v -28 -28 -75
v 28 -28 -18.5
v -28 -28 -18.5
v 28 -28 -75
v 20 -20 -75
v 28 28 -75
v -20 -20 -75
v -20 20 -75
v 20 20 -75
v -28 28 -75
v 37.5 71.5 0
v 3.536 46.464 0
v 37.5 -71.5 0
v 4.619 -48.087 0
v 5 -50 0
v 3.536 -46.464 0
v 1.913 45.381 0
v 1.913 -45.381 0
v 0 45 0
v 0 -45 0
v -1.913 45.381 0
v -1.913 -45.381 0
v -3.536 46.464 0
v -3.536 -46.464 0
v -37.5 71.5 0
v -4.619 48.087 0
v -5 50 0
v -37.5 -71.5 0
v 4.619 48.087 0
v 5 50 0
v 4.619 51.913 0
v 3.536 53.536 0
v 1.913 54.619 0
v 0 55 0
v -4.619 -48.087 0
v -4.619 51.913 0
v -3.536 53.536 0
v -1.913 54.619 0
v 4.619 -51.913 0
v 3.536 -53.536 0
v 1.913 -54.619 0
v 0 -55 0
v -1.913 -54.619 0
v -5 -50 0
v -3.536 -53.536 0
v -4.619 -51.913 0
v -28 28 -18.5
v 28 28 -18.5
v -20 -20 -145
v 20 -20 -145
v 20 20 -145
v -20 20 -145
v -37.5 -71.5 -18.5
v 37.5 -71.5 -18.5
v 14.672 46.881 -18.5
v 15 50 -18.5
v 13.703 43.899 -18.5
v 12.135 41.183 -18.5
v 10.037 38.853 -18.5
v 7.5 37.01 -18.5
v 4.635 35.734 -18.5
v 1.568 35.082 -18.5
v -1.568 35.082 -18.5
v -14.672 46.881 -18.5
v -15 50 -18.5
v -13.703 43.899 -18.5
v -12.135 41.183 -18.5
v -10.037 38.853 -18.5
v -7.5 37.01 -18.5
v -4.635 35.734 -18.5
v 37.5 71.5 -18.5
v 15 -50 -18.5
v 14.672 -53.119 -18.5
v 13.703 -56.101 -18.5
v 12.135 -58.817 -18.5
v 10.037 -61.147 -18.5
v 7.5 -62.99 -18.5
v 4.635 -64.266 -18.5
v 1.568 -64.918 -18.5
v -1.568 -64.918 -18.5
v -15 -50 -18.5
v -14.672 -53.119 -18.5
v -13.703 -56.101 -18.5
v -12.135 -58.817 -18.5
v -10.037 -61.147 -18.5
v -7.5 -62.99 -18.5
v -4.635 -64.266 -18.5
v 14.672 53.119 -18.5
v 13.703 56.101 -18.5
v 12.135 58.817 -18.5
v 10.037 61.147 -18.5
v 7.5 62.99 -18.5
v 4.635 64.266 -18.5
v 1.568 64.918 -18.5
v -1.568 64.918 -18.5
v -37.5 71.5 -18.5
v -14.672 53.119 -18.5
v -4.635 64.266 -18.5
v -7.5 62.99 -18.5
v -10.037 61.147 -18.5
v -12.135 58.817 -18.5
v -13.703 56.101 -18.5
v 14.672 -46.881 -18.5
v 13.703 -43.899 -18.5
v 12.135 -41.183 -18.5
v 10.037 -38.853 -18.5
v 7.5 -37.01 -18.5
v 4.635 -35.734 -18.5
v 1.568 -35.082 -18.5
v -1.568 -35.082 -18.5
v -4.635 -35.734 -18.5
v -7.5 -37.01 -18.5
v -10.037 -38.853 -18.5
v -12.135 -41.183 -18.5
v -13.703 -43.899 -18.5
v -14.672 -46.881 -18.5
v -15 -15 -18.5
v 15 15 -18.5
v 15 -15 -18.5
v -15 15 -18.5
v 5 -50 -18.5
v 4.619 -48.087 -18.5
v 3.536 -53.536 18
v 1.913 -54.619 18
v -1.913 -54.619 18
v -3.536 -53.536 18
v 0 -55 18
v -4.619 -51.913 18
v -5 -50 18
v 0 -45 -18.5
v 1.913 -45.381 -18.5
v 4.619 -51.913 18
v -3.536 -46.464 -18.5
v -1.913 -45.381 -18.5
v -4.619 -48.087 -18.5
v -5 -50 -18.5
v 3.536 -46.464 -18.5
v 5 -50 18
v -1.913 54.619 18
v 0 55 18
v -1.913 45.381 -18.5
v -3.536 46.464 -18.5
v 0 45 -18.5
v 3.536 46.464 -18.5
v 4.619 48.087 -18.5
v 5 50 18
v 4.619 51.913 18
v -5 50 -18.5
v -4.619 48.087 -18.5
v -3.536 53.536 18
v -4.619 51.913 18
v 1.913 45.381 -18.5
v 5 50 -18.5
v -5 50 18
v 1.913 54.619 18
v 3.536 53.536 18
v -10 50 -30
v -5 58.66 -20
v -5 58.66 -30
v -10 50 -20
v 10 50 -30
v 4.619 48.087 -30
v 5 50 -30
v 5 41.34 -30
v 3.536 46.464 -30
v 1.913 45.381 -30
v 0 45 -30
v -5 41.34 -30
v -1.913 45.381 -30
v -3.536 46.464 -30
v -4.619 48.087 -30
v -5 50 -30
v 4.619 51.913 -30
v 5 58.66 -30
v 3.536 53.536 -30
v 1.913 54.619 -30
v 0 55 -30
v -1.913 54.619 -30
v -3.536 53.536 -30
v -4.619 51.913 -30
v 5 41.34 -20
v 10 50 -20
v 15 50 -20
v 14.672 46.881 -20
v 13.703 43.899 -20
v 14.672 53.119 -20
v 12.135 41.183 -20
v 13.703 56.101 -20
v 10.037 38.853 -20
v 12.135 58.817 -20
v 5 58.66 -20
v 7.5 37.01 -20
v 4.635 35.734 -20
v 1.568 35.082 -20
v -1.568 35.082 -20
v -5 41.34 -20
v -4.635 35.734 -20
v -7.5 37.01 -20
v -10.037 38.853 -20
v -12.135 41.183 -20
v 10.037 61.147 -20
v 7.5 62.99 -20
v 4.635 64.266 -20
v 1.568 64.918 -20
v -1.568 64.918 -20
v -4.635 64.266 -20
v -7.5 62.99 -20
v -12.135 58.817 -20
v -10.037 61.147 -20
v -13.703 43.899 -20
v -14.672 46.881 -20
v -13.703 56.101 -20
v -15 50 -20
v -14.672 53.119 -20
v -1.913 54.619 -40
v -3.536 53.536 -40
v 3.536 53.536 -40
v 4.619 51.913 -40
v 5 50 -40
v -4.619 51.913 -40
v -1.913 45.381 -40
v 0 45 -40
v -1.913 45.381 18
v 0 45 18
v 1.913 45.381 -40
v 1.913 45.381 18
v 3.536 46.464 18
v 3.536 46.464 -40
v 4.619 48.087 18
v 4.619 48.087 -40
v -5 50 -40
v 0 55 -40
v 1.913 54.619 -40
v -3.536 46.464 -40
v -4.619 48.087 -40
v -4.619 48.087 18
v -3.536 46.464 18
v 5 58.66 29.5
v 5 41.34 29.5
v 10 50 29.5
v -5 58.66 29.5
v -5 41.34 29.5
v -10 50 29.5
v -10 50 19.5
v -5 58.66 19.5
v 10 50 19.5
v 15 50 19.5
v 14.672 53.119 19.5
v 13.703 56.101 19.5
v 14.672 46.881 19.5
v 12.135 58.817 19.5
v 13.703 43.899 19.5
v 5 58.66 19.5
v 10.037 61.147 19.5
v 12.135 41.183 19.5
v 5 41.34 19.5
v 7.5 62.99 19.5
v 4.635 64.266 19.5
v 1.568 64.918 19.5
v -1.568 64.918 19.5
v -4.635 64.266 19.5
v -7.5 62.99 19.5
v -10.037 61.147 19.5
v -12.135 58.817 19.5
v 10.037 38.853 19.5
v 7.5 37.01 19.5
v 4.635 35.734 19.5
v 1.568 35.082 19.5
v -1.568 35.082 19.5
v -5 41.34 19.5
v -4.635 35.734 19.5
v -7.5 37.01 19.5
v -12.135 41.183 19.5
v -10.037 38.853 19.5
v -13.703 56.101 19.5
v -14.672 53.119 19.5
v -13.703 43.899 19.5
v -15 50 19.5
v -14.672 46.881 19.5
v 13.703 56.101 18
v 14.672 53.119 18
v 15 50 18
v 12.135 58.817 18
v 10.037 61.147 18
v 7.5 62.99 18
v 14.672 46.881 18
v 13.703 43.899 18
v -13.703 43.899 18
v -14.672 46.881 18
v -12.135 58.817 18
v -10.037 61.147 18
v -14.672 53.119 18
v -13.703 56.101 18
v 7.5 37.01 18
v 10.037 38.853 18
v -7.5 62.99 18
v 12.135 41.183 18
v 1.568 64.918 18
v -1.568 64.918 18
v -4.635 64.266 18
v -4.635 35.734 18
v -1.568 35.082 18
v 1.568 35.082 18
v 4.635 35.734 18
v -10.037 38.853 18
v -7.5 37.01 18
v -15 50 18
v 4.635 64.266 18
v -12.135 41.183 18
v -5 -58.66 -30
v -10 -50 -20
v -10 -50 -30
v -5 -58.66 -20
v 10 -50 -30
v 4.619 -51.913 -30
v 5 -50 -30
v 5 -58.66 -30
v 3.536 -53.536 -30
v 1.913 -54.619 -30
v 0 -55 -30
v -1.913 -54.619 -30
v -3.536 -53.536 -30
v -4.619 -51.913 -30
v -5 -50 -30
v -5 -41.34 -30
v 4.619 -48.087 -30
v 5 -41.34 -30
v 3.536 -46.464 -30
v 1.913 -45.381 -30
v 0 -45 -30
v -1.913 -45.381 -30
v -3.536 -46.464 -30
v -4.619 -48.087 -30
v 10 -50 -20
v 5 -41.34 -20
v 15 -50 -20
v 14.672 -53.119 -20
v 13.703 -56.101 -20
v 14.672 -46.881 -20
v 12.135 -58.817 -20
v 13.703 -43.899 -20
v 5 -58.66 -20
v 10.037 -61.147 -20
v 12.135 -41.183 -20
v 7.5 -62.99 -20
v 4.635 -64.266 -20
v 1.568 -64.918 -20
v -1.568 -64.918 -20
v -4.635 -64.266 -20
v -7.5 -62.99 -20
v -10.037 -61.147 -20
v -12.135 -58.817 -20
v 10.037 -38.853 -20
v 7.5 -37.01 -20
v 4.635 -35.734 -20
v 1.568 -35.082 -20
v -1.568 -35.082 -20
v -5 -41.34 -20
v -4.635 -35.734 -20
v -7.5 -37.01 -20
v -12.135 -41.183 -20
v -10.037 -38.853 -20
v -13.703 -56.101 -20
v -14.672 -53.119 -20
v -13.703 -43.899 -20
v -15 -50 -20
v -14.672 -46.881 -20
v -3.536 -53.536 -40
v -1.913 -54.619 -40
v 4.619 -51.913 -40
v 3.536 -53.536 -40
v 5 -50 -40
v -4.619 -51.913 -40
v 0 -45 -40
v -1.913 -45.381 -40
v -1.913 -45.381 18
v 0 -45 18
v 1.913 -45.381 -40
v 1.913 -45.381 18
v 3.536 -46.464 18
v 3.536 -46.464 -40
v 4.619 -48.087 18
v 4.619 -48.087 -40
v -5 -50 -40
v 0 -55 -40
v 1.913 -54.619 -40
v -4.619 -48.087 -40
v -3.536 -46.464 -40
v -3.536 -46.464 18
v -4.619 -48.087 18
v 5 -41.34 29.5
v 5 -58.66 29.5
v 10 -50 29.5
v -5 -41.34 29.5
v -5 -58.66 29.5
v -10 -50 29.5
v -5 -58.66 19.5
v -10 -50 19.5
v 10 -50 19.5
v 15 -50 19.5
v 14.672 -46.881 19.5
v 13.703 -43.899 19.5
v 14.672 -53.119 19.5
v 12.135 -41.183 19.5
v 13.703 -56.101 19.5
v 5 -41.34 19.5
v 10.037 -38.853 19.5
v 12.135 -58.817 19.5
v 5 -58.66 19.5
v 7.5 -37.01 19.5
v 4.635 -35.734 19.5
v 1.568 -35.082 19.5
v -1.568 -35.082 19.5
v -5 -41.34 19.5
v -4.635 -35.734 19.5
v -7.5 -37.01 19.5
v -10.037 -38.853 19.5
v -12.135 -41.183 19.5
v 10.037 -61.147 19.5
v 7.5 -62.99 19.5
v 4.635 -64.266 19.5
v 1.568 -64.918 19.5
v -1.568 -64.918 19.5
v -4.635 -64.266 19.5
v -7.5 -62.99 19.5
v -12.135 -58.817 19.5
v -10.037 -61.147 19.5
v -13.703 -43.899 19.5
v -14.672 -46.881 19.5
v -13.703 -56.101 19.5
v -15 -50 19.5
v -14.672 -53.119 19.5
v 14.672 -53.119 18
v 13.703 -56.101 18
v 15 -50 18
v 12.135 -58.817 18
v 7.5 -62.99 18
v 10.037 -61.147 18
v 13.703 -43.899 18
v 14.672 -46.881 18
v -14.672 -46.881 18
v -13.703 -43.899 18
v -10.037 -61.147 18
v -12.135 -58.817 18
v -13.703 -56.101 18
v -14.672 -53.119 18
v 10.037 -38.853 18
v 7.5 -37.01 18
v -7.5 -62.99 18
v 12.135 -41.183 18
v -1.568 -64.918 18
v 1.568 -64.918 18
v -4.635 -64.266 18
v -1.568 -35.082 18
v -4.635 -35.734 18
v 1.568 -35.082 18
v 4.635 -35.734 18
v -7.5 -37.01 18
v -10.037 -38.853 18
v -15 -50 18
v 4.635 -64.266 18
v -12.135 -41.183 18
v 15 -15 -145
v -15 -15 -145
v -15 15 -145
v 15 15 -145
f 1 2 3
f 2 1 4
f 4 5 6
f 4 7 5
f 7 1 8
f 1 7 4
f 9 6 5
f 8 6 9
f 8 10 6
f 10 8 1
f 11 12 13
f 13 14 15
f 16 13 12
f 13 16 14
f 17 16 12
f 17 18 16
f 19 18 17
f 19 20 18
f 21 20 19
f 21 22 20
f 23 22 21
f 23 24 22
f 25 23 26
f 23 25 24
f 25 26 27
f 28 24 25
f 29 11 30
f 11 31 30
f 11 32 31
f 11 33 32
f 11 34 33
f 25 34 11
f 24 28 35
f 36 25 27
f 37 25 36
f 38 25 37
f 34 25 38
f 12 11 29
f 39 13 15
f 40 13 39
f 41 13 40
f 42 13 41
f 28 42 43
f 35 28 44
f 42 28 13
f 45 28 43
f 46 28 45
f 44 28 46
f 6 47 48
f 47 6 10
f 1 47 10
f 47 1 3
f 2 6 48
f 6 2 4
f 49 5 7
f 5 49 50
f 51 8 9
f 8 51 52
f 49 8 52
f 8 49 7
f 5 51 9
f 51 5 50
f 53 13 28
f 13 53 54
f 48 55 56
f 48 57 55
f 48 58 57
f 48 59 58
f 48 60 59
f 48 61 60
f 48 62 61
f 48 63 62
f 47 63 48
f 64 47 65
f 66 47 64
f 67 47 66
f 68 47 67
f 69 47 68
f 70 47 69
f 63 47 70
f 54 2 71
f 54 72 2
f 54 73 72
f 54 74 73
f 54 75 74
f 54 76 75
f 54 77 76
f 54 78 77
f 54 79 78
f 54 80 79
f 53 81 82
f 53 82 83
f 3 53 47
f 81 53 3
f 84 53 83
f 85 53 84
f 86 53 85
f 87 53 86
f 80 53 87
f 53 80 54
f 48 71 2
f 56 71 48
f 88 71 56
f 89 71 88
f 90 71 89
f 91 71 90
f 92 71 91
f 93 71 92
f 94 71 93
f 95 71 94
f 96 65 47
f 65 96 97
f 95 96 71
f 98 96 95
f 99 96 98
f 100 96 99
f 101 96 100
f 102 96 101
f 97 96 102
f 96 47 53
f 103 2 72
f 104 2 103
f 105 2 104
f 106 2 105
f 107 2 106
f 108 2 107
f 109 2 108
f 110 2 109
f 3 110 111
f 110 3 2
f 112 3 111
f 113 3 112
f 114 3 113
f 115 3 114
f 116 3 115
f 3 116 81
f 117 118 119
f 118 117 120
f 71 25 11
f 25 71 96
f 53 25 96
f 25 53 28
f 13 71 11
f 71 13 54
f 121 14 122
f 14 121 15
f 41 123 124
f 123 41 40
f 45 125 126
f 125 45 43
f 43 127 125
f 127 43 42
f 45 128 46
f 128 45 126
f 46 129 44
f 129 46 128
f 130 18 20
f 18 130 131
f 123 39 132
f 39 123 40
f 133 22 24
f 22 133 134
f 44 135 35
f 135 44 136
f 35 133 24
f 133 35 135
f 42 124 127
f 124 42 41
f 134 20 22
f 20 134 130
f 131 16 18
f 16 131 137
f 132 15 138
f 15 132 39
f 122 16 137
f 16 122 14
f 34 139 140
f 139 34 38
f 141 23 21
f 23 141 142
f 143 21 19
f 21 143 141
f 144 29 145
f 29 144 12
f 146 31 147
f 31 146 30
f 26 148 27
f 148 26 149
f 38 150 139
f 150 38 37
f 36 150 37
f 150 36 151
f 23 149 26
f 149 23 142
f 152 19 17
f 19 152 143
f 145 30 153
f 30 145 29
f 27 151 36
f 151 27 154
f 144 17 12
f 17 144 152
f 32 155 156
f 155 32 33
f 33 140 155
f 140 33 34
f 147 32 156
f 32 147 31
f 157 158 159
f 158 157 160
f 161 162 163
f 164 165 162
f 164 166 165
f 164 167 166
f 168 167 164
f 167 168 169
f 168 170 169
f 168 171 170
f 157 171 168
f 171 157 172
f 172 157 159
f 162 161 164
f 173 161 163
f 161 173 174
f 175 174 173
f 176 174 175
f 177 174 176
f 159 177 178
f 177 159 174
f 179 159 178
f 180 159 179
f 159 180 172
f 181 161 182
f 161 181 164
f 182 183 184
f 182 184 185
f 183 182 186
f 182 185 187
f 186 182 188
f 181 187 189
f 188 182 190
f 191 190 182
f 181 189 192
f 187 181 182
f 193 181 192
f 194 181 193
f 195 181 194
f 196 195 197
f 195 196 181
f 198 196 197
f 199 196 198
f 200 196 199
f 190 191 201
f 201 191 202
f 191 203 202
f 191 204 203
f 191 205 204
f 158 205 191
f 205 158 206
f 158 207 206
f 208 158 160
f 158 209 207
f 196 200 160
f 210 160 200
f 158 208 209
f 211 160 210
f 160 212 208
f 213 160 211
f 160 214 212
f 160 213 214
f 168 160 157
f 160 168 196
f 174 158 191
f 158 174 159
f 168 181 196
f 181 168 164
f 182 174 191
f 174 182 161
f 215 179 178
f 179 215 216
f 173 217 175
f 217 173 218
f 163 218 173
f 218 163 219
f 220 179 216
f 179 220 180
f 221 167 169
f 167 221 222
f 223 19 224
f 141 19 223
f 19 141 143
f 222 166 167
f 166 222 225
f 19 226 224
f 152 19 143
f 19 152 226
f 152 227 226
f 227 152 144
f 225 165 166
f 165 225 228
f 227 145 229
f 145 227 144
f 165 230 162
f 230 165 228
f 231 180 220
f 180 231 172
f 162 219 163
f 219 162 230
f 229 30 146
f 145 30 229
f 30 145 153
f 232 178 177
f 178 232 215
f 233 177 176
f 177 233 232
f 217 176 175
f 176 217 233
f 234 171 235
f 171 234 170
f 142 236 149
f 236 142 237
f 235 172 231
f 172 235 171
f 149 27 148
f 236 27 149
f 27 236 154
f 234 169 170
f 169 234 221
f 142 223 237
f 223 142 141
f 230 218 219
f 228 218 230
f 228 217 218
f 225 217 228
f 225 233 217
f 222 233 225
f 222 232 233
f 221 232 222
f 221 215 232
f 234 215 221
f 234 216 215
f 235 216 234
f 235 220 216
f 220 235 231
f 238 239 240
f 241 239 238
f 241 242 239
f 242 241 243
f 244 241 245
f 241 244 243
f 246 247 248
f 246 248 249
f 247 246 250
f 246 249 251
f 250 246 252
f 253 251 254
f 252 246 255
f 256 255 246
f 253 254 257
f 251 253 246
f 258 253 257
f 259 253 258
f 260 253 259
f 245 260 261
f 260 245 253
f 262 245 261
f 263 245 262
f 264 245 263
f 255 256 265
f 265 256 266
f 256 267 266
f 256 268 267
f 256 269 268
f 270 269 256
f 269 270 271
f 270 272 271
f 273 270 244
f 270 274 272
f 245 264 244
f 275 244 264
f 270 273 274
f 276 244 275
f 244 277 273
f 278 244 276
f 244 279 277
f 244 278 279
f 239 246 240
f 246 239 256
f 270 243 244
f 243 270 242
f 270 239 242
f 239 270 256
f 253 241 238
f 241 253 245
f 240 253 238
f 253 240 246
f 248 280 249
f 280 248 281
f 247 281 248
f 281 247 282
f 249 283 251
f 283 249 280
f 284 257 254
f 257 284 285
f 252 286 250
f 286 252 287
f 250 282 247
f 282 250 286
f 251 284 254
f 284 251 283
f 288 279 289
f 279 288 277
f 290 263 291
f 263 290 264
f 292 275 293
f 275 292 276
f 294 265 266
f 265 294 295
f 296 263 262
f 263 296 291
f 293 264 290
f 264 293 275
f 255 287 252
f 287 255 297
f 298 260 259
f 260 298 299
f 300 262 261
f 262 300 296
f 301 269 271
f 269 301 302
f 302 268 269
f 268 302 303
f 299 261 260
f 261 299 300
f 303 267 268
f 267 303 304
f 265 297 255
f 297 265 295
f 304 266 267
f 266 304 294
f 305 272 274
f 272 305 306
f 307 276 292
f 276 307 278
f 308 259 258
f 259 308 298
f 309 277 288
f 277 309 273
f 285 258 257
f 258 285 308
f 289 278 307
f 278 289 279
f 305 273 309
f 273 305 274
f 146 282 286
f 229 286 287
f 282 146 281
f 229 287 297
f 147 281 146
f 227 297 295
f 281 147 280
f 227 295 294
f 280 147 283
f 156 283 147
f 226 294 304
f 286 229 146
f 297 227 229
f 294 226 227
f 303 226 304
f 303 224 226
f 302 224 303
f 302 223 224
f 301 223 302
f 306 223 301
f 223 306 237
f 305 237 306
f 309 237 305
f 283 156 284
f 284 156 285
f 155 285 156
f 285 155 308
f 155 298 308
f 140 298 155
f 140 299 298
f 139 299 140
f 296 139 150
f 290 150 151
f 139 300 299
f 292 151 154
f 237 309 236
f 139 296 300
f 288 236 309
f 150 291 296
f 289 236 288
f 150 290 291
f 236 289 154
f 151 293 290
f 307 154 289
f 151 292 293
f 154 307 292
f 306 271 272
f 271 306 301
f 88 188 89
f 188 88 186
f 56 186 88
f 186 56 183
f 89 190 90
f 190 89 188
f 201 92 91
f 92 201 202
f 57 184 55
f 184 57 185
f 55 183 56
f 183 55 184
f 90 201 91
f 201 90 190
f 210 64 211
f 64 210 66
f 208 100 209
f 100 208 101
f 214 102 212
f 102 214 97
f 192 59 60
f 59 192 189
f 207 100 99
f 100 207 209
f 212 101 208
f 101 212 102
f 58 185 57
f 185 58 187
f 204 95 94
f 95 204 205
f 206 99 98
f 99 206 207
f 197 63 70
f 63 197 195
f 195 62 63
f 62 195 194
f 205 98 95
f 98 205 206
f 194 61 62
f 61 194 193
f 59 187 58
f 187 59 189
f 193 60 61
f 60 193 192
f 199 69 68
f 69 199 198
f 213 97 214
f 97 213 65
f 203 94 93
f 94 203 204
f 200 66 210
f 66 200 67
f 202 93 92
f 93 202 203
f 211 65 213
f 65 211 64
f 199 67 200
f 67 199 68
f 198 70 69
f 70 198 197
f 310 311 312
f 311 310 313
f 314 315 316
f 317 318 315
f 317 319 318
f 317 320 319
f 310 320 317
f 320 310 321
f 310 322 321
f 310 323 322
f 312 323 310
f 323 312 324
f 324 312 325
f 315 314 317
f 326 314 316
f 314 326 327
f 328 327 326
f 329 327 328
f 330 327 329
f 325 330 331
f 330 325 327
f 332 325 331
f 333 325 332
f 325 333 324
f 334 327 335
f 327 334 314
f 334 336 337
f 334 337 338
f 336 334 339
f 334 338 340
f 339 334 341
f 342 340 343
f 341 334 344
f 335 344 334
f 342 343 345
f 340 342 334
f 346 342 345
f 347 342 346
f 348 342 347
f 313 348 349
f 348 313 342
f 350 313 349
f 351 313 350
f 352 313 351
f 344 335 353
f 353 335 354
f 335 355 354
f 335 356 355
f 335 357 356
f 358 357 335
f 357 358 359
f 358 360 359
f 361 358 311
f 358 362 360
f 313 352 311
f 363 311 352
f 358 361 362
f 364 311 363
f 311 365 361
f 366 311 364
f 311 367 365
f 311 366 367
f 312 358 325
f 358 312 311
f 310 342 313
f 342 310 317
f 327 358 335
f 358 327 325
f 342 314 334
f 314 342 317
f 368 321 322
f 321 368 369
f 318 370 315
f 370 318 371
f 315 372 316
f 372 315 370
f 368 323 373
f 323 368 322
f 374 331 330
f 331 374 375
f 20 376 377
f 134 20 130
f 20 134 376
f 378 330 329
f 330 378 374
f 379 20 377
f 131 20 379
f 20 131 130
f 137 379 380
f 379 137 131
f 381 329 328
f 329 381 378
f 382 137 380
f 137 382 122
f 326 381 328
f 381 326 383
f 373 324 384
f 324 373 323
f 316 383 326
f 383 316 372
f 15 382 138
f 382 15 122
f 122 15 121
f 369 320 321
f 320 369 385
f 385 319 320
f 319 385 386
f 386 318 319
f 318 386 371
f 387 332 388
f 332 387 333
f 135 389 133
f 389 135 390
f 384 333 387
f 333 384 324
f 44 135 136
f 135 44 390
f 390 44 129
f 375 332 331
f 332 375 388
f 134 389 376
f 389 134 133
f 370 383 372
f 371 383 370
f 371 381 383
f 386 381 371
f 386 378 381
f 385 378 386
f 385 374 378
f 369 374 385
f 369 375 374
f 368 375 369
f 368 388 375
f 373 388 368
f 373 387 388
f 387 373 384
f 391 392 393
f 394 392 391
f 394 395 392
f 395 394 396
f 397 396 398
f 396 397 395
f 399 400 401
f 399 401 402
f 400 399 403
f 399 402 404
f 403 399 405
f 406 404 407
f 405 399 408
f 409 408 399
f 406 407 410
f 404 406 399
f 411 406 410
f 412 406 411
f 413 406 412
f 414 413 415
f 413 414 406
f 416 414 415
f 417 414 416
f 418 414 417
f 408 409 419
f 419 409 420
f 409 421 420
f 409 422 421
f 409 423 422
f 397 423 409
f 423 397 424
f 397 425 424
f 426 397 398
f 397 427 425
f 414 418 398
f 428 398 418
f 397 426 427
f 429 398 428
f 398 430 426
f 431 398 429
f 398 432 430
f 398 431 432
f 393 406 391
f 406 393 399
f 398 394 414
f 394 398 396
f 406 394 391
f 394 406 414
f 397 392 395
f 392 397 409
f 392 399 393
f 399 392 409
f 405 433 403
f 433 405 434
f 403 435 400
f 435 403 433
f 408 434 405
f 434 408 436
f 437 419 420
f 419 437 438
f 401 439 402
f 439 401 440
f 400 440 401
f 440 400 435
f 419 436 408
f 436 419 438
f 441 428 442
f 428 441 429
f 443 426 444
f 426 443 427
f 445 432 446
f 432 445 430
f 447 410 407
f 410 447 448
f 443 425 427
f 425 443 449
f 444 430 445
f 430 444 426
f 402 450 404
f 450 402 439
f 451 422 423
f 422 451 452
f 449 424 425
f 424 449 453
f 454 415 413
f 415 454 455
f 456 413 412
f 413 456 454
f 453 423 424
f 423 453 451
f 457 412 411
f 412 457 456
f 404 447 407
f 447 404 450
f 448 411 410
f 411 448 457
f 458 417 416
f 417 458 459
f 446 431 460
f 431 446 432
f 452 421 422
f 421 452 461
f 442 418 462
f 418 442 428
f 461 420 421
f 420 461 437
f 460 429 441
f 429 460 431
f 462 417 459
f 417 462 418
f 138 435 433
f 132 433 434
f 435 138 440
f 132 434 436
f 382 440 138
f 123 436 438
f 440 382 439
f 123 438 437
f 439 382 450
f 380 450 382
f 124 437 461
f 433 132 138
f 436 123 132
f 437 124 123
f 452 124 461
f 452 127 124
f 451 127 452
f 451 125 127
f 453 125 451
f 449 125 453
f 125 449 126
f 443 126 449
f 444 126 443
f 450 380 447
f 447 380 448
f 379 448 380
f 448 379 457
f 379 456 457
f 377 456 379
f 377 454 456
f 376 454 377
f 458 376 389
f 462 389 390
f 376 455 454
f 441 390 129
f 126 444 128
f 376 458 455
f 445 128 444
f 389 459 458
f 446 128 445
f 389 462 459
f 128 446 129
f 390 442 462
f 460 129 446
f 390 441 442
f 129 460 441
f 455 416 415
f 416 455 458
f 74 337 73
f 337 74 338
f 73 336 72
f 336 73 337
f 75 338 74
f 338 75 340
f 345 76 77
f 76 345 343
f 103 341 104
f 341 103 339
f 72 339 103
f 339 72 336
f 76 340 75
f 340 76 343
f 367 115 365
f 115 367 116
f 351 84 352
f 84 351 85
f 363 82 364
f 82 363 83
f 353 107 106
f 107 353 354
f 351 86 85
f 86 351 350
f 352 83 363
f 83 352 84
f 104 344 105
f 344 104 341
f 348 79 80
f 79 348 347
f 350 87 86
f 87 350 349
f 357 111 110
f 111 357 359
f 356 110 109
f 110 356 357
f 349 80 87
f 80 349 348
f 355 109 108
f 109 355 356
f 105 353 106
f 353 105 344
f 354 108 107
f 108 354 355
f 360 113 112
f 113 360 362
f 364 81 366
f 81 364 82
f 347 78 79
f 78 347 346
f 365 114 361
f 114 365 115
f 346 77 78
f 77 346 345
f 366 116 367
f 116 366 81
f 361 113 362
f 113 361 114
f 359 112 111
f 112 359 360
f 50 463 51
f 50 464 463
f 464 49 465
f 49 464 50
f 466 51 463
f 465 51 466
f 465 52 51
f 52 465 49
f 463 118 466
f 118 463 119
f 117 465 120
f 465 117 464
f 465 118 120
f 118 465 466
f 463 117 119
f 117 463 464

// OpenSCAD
// file: ../common/beam_hollow_rectangular.scad
module beam_hollow_rectangular(L, w, d, t, suppress_shopping_outputs = false) {
    difference() {
        cube([w, d, L], center = true);
        cube([w - t * 2, d - t * 2, L], center = true);
    }
    // Shopping
    if (!suppress_shopping_outputs) {
        echo(str("Rectangular Aluminium hollow beam: Rectangular Aluminium hollow beam ", L, "mm x ", w, "mm x ", d, "mm x ", t, "mm - x1"));
    }
}

beam_hollow_rectangular(500, 50, 30, 5);
// file: ../common/beam_hollow_square.scad
include <../../config.scad>;
use <./beam_hollow_rectangular.scad>;

module beam_hollow_square(L, D, T) {
    color(COLOUR_BEAM_ALUMINIUM) beam_hollow_rectangular(L, D, D, T, suppress_shopping_outputs = true);
    // Shopping
    echo(str("Square Aluminium hollow beam: Square Aluminium hollow beam ", L, "mm x ", D, "mm x ", D, "mm x ", T, "mm - x1"));
}

beam_hollow_square(L, D, T);
// file: ../common/metric_nut.scad
// include <../../config.scad>;
use <./beam_hexagonal.scad>;
use <./metric_bolt_functions.scad>;

module metric_nut(size, centre = true) {
    height = get_metric_bolt_head_height(size);
    diameter = get_metric_bolt_head_diameter(size);
    radius = diameter / 2;
    color("gray") difference() {
        // body
        beam_hexagonal(height, diameter, centre = centre, suppress_shopping_outputs = true);
        // hole
        cylinder(height, size / 2, size / 2, center = centre);
    }
    // Shopping
    echo(str("Nut: Nut M", size, " - x1"));
}

// $fn = 200;
metric_nut(12);
// file: ../common/beam_hexagonal.scad
// include <../../config.scad>;

module beam_hexagonal(L, d, centre = true, suppress_shopping_outputs = false) {
    radius = d / 2;
    linear_extrude(L, center = centre) polygon([[radius, 0], [radius * cos(60), radius * sin(60)], [radius * cos(120), radius * sin(120)], [radius * cos(180), radius * sin(180)], [radius * cos(240), radius * sin(240)], [radius * cos(300), radius * sin(300)]]);
    // Shopping
    if (!suppress_shopping_outputs) {
        echo(str("Hexagonal beam: Hexagonal beam Φ", d, "mm x ", L, "mm - x1"));
    }
}

// $fn = 200;
beam_hexagonal(500, 50);
// file: ../fixings/tube_clamp_round_base_plate_132_functions.scad
function get_L_shaft_with_base_plate_round_base_plate_132(tube_diameter) = 
    (tube_diameter == 27) ? 
        85
    : (tube_diameter == 42) ?
        122
    : 25
;
function get_R_plate_round_base_plate_132(tube_diameter) = 
    (tube_diameter == 27) ? 
        [64, 114, 7]
    : (tube_diameter == 42) ?
        [80, 140, 10]
    : [10, 20, 1]
;
function get_offset_hole_y_round_base_plate_132(tube_diameter) = 
    (tube_diameter == 27) ? 
        38
    : (tube_diameter == 42) ?
        50
    : 10
;
function get_diameter_hole_round_base_plate_132(tube_diameter) = 10;
// file: ../fixings/tube_clamp_round_3_way_through_116_functions.scad
function  get_L_shaft_long_round_3_way_through_116(tube_diameter) = 
    (tube_diameter == 27) ? 
        42
    : (tube_diameter == 42) ?
        60
    : 25
;
function get_thickness_round_3_way_through_116(tube_diameter) = 7;
function get_L_shaft_short_round_3_way_through_116(tube_diameter) = tube_diameter + 2 * get_thickness_round_3_way_through_116();
// file: ../fixings/tube_clamp_round_tee_long_104_functions.scad
// include <../../config.scad>;

function get_L_shaft_long_round_tee_long_104(tube_diameter) = 
    (tube_diameter == 27) ? 
        85
    : (tube_diameter == 42) ?
        122
    : 25
;
function get_L_shaft_short_round_tee_long_104(tube_diameter) = 
    (tube_diameter == 27) ? 
        42
    : (tube_diameter == 42) ?
        61
    : 10
;
// file: brake_assembly_functions.scad
// include <../../config.scad>; // circular reference!

function get_y_pos_lead_fixing_ballscrew_to_brake_arms(angle_brake_rod, y_pos_axle_rear, x_pos_axle_leg_rear, x_offset_fixing_brake_arm_to_lead_plate) = y_pos_axle_rear + (x_pos_axle_leg_rear - x_offset_fixing_brake_arm_to_lead_plate) / tan(angle_brake_rod); // (X_POS_AXLE_LEG_REAR - X_OFFSET_FIXING_BRAKE_ARM_TO_LEAD_PLATE)
// file: beam_leg_ballscrew_to_bed.scad
include <../../config.scad>;
use <../common/beam_hollow_square.scad>;

module beam_leg_ballscrew_to_bed() {
    color(COLOUR_BEAM_ALUMINIUM) beam_hollow_square(L_LEG_FIXING_BRAKE_BALLSCREW_TO_BED, D_BEAM_BRAKE, T_BEAM_BRAKE);
    // Shopping
    // Beam leg ballscrew to bed
}

beam_leg_ballscrew_to_bed();
// file: ../fixings/tube_clamp_square_base_plate_132_functions.scad
function get_L_shaft_with_base_plate_square_base_plate_132(beam_width) = 
    // (beam_width == 40) ?
    75
;
function get_R_plate_square_base_plate_132(beam_width) = 
    // (beam_width == 40) ?
    [143, 75, 18.5]
;
function get_thickness_square_base_plate_132(beam_width) = 
    // (beam_width == 40) ?
    8
;
function get_offset_hole_x_square_base_plate_132(beam_width) = 
    // (beam_width == 40) ?
    100 / 2
;
function get_diameter_hole_square_base_plate_132(beam_width) = 
    // (beam_width == 40) ?
    10
;
// file: ../fixings/tube_clamp_square_base_plate_132.scad
include <../../config.scad>;
use <./tube_clamp_square_base_plate_132_functions.scad>;

module tube_clamp_square_base_plate_132(beam_width) {
    L_shaft_with_base_plate = get_L_shaft_with_base_plate_square_base_plate_132(beam_width);
    R_plate = get_R_plate_square_base_plate_132(beam_width);
    t = get_thickness_square_base_plate_132(beam_width);
    offset_hole_x = get_offset_hole_x_square_base_plate_132(beam_width);
    d_hole_bolt_square_base_plate_132 = get_diameter_hole_square_base_plate_132(beam_width);
    color("LightGrey") union() {
        // shaft section
        translate([0, 0, L_shaft_with_base_plate / 2]) difference() {
            cube([beam_width + t * 2, beam_width + t * 2, L_shaft_with_base_plate], center = true);
            cube([beam_width, beam_width, L_shaft_with_base_plate], center = true);
        }
        // base plate
        translate([0, 0, R_plate[2] / 2]) difference() {
            cube(R_plate, center = true);
            translate([offset_hole_x, 0, 0]) cylinder(R_plate[2], d_hole_bolt_square_base_plate_132 / 2, d_hole_bolt_square_base_plate_132 / 2, center = true);
            translate([-offset_hole_x, 0, 0]) cylinder(R_plate[2], d_hole_bolt_square_base_plate_132 / 2, d_hole_bolt_square_base_plate_132 / 2, center = true);
        }
    }
    // Shopping
    echo("Square base plate 132: Tube clamp - x1");
}

// test output
tube_clamp_square_base_plate_132(42);
// file: ../common/washer.scad
include <../../config.scad>;

module washer(t, d_outer, d_inner, centre = true) {
    r_outer = d_outer / 2;
    r_inner = d_inner / 2;
    color("silver") difference() {
        cylinder(t, r_outer, r_outer, center = centre);
        cylinder(t, r_inner, r_inner, center = centre);
    }
    // Shopping
    echo(str("Washer: Washer Φ", d_outer, "mm x ", d_inner, "mm x ", t, "mm - x1"));
}

// $fn = 200;
washer(3, 10, 40);
// file: ../common/metric_bolt_functions.scad
function get_metric_bolt_head_height(size) = size;
function get_metric_bolt_head_diameter(size) = size * 2;
function get_metric_bolt_washer_diameter_safe_working_clearance(size) = 
    (size < 20) ?
        4 * size
    :
        3 * size
;
// file: ../common/metric_bolt.scad
// include <../../config.scad>;
use <./beam_hexagonal.scad>;
use <./metric_bolt_functions.scad>;
use <./metric_nut.scad>;

module metric_bolt(size, length, has_nut = true, offset_nut_from_end = 0) {
    echo("Metric bolt assembly:");
    head_height = get_metric_bolt_head_height(size);
    head_diameter = get_metric_bolt_head_diameter(size);
    head_radius = head_diameter / 2;
    color("gray") union() {
        // Stem
        cylinder(length, size / 2, size / 2, center = true);
        // Head
        translate([0, 0, length / 2 - size / 2]) beam_hexagonal(head_height, head_diameter, centre = true, suppress_shopping_outputs = true);
        if (has_nut) {
            // Nut
            translate([0, 0, -(length / 2 - size / 2) + offset_nut_from_end]) metric_nut(size);
        }
    }
    // Shopping
    echo(str("Bolt: Bolt M", size, " x ", length, "mm - x1"));
}

// $fn = 200;
metric_bolt(12, 100);
translate([30, 0, 0]) metric_bolt(12, 100, false);
translate([60, 0, 0]) metric_bolt(12, 100, true, 5);
// main file
include <../../config.scad>;
use <../common/metric_bolt.scad>;
use <../common/metric_bolt_functions.scad>;
use <../common/washer.scad>;
use <../fixings/tube_clamp_square_base_plate_132.scad>;
use <../fixings/tube_clamp_square_base_plate_132_functions.scad>;
use <./beam_leg_ballscrew_to_bed.scad>;


module fixing_ballscrew_to_bed() {
    echo("Fixing ballscrew to bed: ");
    y_offset_hole_bed_fastener = get_offset_hole_x_square_base_plate_132(D_BEAM_BRAKE);
    d_hole_fastener = get_diameter_hole_square_base_plate_132();
    h_head_fastener = get_metric_bolt_head_height(d_hole_fastener);
    L_fastener = R_BED[2] + 2 * (T_WASHER_BASE_PLATE + h_head_fastener) + R_BASE_PLATE_FIXING_LEG_BRAKE_BALLSCREW_TO_BED[2] + L_BOLT_EXTENSION;
    // d_washer_outer = get_metric_bolt_washer_diameter_safe_working_clearance(d_hole_fastener);
    union() {
        // fixing tube clamp
        rotate([0, 180, 90]) tube_clamp_square_base_plate_132(D_BEAM_BRAKE);
        
        for (index_side_y = [0:1:1]) {
            mirror([0, index_side_y, 0]) translate([0, y_offset_hole_bed_fastener, 0]) {
                // fastener bolt
                translate([0, 0, -L_fastener / 2 + R_BED[2] + T_WASHER_BASE_PLATE + h_head_fastener]) metric_bolt(d_hole_fastener, L_fastener, true, L_BOLT_EXTENSION);
                // fastener washers
                // bed side
                translate([0, 0, R_BED[2] + T_WASHER_BASE_PLATE / 2]) washer(T_WASHER_BASE_PLATE, D_WASHER_BASE_PLATE, d_hole_fastener);
                // axle side
                translate([0, 0, -R_BASE_PLATE_FIXING_LEG_BRAKE_BALLSCREW_TO_BED[2] - T_WASHER_BASE_PLATE / 2]) washer(T_WASHER_BASE_PLATE, D_WASHER_BASE_PLATE, d_hole_fastener);
            }
        }
        // leg
        translate([0, 0, -R_BASE_PLATE_FIXING_LEG_BRAKE_BALLSCREW_TO_BED[2] - L_LEG_FIXING_BRAKE_BALLSCREW_TO_BED / 2]) beam_leg_ballscrew_to_bed();
    }
    // Shopping
    // Fixing leg to bed
    // Fixing fasteners
    // Fixing fastener washers
    // Leg
}

fixing_ballscrew_to_bed();
